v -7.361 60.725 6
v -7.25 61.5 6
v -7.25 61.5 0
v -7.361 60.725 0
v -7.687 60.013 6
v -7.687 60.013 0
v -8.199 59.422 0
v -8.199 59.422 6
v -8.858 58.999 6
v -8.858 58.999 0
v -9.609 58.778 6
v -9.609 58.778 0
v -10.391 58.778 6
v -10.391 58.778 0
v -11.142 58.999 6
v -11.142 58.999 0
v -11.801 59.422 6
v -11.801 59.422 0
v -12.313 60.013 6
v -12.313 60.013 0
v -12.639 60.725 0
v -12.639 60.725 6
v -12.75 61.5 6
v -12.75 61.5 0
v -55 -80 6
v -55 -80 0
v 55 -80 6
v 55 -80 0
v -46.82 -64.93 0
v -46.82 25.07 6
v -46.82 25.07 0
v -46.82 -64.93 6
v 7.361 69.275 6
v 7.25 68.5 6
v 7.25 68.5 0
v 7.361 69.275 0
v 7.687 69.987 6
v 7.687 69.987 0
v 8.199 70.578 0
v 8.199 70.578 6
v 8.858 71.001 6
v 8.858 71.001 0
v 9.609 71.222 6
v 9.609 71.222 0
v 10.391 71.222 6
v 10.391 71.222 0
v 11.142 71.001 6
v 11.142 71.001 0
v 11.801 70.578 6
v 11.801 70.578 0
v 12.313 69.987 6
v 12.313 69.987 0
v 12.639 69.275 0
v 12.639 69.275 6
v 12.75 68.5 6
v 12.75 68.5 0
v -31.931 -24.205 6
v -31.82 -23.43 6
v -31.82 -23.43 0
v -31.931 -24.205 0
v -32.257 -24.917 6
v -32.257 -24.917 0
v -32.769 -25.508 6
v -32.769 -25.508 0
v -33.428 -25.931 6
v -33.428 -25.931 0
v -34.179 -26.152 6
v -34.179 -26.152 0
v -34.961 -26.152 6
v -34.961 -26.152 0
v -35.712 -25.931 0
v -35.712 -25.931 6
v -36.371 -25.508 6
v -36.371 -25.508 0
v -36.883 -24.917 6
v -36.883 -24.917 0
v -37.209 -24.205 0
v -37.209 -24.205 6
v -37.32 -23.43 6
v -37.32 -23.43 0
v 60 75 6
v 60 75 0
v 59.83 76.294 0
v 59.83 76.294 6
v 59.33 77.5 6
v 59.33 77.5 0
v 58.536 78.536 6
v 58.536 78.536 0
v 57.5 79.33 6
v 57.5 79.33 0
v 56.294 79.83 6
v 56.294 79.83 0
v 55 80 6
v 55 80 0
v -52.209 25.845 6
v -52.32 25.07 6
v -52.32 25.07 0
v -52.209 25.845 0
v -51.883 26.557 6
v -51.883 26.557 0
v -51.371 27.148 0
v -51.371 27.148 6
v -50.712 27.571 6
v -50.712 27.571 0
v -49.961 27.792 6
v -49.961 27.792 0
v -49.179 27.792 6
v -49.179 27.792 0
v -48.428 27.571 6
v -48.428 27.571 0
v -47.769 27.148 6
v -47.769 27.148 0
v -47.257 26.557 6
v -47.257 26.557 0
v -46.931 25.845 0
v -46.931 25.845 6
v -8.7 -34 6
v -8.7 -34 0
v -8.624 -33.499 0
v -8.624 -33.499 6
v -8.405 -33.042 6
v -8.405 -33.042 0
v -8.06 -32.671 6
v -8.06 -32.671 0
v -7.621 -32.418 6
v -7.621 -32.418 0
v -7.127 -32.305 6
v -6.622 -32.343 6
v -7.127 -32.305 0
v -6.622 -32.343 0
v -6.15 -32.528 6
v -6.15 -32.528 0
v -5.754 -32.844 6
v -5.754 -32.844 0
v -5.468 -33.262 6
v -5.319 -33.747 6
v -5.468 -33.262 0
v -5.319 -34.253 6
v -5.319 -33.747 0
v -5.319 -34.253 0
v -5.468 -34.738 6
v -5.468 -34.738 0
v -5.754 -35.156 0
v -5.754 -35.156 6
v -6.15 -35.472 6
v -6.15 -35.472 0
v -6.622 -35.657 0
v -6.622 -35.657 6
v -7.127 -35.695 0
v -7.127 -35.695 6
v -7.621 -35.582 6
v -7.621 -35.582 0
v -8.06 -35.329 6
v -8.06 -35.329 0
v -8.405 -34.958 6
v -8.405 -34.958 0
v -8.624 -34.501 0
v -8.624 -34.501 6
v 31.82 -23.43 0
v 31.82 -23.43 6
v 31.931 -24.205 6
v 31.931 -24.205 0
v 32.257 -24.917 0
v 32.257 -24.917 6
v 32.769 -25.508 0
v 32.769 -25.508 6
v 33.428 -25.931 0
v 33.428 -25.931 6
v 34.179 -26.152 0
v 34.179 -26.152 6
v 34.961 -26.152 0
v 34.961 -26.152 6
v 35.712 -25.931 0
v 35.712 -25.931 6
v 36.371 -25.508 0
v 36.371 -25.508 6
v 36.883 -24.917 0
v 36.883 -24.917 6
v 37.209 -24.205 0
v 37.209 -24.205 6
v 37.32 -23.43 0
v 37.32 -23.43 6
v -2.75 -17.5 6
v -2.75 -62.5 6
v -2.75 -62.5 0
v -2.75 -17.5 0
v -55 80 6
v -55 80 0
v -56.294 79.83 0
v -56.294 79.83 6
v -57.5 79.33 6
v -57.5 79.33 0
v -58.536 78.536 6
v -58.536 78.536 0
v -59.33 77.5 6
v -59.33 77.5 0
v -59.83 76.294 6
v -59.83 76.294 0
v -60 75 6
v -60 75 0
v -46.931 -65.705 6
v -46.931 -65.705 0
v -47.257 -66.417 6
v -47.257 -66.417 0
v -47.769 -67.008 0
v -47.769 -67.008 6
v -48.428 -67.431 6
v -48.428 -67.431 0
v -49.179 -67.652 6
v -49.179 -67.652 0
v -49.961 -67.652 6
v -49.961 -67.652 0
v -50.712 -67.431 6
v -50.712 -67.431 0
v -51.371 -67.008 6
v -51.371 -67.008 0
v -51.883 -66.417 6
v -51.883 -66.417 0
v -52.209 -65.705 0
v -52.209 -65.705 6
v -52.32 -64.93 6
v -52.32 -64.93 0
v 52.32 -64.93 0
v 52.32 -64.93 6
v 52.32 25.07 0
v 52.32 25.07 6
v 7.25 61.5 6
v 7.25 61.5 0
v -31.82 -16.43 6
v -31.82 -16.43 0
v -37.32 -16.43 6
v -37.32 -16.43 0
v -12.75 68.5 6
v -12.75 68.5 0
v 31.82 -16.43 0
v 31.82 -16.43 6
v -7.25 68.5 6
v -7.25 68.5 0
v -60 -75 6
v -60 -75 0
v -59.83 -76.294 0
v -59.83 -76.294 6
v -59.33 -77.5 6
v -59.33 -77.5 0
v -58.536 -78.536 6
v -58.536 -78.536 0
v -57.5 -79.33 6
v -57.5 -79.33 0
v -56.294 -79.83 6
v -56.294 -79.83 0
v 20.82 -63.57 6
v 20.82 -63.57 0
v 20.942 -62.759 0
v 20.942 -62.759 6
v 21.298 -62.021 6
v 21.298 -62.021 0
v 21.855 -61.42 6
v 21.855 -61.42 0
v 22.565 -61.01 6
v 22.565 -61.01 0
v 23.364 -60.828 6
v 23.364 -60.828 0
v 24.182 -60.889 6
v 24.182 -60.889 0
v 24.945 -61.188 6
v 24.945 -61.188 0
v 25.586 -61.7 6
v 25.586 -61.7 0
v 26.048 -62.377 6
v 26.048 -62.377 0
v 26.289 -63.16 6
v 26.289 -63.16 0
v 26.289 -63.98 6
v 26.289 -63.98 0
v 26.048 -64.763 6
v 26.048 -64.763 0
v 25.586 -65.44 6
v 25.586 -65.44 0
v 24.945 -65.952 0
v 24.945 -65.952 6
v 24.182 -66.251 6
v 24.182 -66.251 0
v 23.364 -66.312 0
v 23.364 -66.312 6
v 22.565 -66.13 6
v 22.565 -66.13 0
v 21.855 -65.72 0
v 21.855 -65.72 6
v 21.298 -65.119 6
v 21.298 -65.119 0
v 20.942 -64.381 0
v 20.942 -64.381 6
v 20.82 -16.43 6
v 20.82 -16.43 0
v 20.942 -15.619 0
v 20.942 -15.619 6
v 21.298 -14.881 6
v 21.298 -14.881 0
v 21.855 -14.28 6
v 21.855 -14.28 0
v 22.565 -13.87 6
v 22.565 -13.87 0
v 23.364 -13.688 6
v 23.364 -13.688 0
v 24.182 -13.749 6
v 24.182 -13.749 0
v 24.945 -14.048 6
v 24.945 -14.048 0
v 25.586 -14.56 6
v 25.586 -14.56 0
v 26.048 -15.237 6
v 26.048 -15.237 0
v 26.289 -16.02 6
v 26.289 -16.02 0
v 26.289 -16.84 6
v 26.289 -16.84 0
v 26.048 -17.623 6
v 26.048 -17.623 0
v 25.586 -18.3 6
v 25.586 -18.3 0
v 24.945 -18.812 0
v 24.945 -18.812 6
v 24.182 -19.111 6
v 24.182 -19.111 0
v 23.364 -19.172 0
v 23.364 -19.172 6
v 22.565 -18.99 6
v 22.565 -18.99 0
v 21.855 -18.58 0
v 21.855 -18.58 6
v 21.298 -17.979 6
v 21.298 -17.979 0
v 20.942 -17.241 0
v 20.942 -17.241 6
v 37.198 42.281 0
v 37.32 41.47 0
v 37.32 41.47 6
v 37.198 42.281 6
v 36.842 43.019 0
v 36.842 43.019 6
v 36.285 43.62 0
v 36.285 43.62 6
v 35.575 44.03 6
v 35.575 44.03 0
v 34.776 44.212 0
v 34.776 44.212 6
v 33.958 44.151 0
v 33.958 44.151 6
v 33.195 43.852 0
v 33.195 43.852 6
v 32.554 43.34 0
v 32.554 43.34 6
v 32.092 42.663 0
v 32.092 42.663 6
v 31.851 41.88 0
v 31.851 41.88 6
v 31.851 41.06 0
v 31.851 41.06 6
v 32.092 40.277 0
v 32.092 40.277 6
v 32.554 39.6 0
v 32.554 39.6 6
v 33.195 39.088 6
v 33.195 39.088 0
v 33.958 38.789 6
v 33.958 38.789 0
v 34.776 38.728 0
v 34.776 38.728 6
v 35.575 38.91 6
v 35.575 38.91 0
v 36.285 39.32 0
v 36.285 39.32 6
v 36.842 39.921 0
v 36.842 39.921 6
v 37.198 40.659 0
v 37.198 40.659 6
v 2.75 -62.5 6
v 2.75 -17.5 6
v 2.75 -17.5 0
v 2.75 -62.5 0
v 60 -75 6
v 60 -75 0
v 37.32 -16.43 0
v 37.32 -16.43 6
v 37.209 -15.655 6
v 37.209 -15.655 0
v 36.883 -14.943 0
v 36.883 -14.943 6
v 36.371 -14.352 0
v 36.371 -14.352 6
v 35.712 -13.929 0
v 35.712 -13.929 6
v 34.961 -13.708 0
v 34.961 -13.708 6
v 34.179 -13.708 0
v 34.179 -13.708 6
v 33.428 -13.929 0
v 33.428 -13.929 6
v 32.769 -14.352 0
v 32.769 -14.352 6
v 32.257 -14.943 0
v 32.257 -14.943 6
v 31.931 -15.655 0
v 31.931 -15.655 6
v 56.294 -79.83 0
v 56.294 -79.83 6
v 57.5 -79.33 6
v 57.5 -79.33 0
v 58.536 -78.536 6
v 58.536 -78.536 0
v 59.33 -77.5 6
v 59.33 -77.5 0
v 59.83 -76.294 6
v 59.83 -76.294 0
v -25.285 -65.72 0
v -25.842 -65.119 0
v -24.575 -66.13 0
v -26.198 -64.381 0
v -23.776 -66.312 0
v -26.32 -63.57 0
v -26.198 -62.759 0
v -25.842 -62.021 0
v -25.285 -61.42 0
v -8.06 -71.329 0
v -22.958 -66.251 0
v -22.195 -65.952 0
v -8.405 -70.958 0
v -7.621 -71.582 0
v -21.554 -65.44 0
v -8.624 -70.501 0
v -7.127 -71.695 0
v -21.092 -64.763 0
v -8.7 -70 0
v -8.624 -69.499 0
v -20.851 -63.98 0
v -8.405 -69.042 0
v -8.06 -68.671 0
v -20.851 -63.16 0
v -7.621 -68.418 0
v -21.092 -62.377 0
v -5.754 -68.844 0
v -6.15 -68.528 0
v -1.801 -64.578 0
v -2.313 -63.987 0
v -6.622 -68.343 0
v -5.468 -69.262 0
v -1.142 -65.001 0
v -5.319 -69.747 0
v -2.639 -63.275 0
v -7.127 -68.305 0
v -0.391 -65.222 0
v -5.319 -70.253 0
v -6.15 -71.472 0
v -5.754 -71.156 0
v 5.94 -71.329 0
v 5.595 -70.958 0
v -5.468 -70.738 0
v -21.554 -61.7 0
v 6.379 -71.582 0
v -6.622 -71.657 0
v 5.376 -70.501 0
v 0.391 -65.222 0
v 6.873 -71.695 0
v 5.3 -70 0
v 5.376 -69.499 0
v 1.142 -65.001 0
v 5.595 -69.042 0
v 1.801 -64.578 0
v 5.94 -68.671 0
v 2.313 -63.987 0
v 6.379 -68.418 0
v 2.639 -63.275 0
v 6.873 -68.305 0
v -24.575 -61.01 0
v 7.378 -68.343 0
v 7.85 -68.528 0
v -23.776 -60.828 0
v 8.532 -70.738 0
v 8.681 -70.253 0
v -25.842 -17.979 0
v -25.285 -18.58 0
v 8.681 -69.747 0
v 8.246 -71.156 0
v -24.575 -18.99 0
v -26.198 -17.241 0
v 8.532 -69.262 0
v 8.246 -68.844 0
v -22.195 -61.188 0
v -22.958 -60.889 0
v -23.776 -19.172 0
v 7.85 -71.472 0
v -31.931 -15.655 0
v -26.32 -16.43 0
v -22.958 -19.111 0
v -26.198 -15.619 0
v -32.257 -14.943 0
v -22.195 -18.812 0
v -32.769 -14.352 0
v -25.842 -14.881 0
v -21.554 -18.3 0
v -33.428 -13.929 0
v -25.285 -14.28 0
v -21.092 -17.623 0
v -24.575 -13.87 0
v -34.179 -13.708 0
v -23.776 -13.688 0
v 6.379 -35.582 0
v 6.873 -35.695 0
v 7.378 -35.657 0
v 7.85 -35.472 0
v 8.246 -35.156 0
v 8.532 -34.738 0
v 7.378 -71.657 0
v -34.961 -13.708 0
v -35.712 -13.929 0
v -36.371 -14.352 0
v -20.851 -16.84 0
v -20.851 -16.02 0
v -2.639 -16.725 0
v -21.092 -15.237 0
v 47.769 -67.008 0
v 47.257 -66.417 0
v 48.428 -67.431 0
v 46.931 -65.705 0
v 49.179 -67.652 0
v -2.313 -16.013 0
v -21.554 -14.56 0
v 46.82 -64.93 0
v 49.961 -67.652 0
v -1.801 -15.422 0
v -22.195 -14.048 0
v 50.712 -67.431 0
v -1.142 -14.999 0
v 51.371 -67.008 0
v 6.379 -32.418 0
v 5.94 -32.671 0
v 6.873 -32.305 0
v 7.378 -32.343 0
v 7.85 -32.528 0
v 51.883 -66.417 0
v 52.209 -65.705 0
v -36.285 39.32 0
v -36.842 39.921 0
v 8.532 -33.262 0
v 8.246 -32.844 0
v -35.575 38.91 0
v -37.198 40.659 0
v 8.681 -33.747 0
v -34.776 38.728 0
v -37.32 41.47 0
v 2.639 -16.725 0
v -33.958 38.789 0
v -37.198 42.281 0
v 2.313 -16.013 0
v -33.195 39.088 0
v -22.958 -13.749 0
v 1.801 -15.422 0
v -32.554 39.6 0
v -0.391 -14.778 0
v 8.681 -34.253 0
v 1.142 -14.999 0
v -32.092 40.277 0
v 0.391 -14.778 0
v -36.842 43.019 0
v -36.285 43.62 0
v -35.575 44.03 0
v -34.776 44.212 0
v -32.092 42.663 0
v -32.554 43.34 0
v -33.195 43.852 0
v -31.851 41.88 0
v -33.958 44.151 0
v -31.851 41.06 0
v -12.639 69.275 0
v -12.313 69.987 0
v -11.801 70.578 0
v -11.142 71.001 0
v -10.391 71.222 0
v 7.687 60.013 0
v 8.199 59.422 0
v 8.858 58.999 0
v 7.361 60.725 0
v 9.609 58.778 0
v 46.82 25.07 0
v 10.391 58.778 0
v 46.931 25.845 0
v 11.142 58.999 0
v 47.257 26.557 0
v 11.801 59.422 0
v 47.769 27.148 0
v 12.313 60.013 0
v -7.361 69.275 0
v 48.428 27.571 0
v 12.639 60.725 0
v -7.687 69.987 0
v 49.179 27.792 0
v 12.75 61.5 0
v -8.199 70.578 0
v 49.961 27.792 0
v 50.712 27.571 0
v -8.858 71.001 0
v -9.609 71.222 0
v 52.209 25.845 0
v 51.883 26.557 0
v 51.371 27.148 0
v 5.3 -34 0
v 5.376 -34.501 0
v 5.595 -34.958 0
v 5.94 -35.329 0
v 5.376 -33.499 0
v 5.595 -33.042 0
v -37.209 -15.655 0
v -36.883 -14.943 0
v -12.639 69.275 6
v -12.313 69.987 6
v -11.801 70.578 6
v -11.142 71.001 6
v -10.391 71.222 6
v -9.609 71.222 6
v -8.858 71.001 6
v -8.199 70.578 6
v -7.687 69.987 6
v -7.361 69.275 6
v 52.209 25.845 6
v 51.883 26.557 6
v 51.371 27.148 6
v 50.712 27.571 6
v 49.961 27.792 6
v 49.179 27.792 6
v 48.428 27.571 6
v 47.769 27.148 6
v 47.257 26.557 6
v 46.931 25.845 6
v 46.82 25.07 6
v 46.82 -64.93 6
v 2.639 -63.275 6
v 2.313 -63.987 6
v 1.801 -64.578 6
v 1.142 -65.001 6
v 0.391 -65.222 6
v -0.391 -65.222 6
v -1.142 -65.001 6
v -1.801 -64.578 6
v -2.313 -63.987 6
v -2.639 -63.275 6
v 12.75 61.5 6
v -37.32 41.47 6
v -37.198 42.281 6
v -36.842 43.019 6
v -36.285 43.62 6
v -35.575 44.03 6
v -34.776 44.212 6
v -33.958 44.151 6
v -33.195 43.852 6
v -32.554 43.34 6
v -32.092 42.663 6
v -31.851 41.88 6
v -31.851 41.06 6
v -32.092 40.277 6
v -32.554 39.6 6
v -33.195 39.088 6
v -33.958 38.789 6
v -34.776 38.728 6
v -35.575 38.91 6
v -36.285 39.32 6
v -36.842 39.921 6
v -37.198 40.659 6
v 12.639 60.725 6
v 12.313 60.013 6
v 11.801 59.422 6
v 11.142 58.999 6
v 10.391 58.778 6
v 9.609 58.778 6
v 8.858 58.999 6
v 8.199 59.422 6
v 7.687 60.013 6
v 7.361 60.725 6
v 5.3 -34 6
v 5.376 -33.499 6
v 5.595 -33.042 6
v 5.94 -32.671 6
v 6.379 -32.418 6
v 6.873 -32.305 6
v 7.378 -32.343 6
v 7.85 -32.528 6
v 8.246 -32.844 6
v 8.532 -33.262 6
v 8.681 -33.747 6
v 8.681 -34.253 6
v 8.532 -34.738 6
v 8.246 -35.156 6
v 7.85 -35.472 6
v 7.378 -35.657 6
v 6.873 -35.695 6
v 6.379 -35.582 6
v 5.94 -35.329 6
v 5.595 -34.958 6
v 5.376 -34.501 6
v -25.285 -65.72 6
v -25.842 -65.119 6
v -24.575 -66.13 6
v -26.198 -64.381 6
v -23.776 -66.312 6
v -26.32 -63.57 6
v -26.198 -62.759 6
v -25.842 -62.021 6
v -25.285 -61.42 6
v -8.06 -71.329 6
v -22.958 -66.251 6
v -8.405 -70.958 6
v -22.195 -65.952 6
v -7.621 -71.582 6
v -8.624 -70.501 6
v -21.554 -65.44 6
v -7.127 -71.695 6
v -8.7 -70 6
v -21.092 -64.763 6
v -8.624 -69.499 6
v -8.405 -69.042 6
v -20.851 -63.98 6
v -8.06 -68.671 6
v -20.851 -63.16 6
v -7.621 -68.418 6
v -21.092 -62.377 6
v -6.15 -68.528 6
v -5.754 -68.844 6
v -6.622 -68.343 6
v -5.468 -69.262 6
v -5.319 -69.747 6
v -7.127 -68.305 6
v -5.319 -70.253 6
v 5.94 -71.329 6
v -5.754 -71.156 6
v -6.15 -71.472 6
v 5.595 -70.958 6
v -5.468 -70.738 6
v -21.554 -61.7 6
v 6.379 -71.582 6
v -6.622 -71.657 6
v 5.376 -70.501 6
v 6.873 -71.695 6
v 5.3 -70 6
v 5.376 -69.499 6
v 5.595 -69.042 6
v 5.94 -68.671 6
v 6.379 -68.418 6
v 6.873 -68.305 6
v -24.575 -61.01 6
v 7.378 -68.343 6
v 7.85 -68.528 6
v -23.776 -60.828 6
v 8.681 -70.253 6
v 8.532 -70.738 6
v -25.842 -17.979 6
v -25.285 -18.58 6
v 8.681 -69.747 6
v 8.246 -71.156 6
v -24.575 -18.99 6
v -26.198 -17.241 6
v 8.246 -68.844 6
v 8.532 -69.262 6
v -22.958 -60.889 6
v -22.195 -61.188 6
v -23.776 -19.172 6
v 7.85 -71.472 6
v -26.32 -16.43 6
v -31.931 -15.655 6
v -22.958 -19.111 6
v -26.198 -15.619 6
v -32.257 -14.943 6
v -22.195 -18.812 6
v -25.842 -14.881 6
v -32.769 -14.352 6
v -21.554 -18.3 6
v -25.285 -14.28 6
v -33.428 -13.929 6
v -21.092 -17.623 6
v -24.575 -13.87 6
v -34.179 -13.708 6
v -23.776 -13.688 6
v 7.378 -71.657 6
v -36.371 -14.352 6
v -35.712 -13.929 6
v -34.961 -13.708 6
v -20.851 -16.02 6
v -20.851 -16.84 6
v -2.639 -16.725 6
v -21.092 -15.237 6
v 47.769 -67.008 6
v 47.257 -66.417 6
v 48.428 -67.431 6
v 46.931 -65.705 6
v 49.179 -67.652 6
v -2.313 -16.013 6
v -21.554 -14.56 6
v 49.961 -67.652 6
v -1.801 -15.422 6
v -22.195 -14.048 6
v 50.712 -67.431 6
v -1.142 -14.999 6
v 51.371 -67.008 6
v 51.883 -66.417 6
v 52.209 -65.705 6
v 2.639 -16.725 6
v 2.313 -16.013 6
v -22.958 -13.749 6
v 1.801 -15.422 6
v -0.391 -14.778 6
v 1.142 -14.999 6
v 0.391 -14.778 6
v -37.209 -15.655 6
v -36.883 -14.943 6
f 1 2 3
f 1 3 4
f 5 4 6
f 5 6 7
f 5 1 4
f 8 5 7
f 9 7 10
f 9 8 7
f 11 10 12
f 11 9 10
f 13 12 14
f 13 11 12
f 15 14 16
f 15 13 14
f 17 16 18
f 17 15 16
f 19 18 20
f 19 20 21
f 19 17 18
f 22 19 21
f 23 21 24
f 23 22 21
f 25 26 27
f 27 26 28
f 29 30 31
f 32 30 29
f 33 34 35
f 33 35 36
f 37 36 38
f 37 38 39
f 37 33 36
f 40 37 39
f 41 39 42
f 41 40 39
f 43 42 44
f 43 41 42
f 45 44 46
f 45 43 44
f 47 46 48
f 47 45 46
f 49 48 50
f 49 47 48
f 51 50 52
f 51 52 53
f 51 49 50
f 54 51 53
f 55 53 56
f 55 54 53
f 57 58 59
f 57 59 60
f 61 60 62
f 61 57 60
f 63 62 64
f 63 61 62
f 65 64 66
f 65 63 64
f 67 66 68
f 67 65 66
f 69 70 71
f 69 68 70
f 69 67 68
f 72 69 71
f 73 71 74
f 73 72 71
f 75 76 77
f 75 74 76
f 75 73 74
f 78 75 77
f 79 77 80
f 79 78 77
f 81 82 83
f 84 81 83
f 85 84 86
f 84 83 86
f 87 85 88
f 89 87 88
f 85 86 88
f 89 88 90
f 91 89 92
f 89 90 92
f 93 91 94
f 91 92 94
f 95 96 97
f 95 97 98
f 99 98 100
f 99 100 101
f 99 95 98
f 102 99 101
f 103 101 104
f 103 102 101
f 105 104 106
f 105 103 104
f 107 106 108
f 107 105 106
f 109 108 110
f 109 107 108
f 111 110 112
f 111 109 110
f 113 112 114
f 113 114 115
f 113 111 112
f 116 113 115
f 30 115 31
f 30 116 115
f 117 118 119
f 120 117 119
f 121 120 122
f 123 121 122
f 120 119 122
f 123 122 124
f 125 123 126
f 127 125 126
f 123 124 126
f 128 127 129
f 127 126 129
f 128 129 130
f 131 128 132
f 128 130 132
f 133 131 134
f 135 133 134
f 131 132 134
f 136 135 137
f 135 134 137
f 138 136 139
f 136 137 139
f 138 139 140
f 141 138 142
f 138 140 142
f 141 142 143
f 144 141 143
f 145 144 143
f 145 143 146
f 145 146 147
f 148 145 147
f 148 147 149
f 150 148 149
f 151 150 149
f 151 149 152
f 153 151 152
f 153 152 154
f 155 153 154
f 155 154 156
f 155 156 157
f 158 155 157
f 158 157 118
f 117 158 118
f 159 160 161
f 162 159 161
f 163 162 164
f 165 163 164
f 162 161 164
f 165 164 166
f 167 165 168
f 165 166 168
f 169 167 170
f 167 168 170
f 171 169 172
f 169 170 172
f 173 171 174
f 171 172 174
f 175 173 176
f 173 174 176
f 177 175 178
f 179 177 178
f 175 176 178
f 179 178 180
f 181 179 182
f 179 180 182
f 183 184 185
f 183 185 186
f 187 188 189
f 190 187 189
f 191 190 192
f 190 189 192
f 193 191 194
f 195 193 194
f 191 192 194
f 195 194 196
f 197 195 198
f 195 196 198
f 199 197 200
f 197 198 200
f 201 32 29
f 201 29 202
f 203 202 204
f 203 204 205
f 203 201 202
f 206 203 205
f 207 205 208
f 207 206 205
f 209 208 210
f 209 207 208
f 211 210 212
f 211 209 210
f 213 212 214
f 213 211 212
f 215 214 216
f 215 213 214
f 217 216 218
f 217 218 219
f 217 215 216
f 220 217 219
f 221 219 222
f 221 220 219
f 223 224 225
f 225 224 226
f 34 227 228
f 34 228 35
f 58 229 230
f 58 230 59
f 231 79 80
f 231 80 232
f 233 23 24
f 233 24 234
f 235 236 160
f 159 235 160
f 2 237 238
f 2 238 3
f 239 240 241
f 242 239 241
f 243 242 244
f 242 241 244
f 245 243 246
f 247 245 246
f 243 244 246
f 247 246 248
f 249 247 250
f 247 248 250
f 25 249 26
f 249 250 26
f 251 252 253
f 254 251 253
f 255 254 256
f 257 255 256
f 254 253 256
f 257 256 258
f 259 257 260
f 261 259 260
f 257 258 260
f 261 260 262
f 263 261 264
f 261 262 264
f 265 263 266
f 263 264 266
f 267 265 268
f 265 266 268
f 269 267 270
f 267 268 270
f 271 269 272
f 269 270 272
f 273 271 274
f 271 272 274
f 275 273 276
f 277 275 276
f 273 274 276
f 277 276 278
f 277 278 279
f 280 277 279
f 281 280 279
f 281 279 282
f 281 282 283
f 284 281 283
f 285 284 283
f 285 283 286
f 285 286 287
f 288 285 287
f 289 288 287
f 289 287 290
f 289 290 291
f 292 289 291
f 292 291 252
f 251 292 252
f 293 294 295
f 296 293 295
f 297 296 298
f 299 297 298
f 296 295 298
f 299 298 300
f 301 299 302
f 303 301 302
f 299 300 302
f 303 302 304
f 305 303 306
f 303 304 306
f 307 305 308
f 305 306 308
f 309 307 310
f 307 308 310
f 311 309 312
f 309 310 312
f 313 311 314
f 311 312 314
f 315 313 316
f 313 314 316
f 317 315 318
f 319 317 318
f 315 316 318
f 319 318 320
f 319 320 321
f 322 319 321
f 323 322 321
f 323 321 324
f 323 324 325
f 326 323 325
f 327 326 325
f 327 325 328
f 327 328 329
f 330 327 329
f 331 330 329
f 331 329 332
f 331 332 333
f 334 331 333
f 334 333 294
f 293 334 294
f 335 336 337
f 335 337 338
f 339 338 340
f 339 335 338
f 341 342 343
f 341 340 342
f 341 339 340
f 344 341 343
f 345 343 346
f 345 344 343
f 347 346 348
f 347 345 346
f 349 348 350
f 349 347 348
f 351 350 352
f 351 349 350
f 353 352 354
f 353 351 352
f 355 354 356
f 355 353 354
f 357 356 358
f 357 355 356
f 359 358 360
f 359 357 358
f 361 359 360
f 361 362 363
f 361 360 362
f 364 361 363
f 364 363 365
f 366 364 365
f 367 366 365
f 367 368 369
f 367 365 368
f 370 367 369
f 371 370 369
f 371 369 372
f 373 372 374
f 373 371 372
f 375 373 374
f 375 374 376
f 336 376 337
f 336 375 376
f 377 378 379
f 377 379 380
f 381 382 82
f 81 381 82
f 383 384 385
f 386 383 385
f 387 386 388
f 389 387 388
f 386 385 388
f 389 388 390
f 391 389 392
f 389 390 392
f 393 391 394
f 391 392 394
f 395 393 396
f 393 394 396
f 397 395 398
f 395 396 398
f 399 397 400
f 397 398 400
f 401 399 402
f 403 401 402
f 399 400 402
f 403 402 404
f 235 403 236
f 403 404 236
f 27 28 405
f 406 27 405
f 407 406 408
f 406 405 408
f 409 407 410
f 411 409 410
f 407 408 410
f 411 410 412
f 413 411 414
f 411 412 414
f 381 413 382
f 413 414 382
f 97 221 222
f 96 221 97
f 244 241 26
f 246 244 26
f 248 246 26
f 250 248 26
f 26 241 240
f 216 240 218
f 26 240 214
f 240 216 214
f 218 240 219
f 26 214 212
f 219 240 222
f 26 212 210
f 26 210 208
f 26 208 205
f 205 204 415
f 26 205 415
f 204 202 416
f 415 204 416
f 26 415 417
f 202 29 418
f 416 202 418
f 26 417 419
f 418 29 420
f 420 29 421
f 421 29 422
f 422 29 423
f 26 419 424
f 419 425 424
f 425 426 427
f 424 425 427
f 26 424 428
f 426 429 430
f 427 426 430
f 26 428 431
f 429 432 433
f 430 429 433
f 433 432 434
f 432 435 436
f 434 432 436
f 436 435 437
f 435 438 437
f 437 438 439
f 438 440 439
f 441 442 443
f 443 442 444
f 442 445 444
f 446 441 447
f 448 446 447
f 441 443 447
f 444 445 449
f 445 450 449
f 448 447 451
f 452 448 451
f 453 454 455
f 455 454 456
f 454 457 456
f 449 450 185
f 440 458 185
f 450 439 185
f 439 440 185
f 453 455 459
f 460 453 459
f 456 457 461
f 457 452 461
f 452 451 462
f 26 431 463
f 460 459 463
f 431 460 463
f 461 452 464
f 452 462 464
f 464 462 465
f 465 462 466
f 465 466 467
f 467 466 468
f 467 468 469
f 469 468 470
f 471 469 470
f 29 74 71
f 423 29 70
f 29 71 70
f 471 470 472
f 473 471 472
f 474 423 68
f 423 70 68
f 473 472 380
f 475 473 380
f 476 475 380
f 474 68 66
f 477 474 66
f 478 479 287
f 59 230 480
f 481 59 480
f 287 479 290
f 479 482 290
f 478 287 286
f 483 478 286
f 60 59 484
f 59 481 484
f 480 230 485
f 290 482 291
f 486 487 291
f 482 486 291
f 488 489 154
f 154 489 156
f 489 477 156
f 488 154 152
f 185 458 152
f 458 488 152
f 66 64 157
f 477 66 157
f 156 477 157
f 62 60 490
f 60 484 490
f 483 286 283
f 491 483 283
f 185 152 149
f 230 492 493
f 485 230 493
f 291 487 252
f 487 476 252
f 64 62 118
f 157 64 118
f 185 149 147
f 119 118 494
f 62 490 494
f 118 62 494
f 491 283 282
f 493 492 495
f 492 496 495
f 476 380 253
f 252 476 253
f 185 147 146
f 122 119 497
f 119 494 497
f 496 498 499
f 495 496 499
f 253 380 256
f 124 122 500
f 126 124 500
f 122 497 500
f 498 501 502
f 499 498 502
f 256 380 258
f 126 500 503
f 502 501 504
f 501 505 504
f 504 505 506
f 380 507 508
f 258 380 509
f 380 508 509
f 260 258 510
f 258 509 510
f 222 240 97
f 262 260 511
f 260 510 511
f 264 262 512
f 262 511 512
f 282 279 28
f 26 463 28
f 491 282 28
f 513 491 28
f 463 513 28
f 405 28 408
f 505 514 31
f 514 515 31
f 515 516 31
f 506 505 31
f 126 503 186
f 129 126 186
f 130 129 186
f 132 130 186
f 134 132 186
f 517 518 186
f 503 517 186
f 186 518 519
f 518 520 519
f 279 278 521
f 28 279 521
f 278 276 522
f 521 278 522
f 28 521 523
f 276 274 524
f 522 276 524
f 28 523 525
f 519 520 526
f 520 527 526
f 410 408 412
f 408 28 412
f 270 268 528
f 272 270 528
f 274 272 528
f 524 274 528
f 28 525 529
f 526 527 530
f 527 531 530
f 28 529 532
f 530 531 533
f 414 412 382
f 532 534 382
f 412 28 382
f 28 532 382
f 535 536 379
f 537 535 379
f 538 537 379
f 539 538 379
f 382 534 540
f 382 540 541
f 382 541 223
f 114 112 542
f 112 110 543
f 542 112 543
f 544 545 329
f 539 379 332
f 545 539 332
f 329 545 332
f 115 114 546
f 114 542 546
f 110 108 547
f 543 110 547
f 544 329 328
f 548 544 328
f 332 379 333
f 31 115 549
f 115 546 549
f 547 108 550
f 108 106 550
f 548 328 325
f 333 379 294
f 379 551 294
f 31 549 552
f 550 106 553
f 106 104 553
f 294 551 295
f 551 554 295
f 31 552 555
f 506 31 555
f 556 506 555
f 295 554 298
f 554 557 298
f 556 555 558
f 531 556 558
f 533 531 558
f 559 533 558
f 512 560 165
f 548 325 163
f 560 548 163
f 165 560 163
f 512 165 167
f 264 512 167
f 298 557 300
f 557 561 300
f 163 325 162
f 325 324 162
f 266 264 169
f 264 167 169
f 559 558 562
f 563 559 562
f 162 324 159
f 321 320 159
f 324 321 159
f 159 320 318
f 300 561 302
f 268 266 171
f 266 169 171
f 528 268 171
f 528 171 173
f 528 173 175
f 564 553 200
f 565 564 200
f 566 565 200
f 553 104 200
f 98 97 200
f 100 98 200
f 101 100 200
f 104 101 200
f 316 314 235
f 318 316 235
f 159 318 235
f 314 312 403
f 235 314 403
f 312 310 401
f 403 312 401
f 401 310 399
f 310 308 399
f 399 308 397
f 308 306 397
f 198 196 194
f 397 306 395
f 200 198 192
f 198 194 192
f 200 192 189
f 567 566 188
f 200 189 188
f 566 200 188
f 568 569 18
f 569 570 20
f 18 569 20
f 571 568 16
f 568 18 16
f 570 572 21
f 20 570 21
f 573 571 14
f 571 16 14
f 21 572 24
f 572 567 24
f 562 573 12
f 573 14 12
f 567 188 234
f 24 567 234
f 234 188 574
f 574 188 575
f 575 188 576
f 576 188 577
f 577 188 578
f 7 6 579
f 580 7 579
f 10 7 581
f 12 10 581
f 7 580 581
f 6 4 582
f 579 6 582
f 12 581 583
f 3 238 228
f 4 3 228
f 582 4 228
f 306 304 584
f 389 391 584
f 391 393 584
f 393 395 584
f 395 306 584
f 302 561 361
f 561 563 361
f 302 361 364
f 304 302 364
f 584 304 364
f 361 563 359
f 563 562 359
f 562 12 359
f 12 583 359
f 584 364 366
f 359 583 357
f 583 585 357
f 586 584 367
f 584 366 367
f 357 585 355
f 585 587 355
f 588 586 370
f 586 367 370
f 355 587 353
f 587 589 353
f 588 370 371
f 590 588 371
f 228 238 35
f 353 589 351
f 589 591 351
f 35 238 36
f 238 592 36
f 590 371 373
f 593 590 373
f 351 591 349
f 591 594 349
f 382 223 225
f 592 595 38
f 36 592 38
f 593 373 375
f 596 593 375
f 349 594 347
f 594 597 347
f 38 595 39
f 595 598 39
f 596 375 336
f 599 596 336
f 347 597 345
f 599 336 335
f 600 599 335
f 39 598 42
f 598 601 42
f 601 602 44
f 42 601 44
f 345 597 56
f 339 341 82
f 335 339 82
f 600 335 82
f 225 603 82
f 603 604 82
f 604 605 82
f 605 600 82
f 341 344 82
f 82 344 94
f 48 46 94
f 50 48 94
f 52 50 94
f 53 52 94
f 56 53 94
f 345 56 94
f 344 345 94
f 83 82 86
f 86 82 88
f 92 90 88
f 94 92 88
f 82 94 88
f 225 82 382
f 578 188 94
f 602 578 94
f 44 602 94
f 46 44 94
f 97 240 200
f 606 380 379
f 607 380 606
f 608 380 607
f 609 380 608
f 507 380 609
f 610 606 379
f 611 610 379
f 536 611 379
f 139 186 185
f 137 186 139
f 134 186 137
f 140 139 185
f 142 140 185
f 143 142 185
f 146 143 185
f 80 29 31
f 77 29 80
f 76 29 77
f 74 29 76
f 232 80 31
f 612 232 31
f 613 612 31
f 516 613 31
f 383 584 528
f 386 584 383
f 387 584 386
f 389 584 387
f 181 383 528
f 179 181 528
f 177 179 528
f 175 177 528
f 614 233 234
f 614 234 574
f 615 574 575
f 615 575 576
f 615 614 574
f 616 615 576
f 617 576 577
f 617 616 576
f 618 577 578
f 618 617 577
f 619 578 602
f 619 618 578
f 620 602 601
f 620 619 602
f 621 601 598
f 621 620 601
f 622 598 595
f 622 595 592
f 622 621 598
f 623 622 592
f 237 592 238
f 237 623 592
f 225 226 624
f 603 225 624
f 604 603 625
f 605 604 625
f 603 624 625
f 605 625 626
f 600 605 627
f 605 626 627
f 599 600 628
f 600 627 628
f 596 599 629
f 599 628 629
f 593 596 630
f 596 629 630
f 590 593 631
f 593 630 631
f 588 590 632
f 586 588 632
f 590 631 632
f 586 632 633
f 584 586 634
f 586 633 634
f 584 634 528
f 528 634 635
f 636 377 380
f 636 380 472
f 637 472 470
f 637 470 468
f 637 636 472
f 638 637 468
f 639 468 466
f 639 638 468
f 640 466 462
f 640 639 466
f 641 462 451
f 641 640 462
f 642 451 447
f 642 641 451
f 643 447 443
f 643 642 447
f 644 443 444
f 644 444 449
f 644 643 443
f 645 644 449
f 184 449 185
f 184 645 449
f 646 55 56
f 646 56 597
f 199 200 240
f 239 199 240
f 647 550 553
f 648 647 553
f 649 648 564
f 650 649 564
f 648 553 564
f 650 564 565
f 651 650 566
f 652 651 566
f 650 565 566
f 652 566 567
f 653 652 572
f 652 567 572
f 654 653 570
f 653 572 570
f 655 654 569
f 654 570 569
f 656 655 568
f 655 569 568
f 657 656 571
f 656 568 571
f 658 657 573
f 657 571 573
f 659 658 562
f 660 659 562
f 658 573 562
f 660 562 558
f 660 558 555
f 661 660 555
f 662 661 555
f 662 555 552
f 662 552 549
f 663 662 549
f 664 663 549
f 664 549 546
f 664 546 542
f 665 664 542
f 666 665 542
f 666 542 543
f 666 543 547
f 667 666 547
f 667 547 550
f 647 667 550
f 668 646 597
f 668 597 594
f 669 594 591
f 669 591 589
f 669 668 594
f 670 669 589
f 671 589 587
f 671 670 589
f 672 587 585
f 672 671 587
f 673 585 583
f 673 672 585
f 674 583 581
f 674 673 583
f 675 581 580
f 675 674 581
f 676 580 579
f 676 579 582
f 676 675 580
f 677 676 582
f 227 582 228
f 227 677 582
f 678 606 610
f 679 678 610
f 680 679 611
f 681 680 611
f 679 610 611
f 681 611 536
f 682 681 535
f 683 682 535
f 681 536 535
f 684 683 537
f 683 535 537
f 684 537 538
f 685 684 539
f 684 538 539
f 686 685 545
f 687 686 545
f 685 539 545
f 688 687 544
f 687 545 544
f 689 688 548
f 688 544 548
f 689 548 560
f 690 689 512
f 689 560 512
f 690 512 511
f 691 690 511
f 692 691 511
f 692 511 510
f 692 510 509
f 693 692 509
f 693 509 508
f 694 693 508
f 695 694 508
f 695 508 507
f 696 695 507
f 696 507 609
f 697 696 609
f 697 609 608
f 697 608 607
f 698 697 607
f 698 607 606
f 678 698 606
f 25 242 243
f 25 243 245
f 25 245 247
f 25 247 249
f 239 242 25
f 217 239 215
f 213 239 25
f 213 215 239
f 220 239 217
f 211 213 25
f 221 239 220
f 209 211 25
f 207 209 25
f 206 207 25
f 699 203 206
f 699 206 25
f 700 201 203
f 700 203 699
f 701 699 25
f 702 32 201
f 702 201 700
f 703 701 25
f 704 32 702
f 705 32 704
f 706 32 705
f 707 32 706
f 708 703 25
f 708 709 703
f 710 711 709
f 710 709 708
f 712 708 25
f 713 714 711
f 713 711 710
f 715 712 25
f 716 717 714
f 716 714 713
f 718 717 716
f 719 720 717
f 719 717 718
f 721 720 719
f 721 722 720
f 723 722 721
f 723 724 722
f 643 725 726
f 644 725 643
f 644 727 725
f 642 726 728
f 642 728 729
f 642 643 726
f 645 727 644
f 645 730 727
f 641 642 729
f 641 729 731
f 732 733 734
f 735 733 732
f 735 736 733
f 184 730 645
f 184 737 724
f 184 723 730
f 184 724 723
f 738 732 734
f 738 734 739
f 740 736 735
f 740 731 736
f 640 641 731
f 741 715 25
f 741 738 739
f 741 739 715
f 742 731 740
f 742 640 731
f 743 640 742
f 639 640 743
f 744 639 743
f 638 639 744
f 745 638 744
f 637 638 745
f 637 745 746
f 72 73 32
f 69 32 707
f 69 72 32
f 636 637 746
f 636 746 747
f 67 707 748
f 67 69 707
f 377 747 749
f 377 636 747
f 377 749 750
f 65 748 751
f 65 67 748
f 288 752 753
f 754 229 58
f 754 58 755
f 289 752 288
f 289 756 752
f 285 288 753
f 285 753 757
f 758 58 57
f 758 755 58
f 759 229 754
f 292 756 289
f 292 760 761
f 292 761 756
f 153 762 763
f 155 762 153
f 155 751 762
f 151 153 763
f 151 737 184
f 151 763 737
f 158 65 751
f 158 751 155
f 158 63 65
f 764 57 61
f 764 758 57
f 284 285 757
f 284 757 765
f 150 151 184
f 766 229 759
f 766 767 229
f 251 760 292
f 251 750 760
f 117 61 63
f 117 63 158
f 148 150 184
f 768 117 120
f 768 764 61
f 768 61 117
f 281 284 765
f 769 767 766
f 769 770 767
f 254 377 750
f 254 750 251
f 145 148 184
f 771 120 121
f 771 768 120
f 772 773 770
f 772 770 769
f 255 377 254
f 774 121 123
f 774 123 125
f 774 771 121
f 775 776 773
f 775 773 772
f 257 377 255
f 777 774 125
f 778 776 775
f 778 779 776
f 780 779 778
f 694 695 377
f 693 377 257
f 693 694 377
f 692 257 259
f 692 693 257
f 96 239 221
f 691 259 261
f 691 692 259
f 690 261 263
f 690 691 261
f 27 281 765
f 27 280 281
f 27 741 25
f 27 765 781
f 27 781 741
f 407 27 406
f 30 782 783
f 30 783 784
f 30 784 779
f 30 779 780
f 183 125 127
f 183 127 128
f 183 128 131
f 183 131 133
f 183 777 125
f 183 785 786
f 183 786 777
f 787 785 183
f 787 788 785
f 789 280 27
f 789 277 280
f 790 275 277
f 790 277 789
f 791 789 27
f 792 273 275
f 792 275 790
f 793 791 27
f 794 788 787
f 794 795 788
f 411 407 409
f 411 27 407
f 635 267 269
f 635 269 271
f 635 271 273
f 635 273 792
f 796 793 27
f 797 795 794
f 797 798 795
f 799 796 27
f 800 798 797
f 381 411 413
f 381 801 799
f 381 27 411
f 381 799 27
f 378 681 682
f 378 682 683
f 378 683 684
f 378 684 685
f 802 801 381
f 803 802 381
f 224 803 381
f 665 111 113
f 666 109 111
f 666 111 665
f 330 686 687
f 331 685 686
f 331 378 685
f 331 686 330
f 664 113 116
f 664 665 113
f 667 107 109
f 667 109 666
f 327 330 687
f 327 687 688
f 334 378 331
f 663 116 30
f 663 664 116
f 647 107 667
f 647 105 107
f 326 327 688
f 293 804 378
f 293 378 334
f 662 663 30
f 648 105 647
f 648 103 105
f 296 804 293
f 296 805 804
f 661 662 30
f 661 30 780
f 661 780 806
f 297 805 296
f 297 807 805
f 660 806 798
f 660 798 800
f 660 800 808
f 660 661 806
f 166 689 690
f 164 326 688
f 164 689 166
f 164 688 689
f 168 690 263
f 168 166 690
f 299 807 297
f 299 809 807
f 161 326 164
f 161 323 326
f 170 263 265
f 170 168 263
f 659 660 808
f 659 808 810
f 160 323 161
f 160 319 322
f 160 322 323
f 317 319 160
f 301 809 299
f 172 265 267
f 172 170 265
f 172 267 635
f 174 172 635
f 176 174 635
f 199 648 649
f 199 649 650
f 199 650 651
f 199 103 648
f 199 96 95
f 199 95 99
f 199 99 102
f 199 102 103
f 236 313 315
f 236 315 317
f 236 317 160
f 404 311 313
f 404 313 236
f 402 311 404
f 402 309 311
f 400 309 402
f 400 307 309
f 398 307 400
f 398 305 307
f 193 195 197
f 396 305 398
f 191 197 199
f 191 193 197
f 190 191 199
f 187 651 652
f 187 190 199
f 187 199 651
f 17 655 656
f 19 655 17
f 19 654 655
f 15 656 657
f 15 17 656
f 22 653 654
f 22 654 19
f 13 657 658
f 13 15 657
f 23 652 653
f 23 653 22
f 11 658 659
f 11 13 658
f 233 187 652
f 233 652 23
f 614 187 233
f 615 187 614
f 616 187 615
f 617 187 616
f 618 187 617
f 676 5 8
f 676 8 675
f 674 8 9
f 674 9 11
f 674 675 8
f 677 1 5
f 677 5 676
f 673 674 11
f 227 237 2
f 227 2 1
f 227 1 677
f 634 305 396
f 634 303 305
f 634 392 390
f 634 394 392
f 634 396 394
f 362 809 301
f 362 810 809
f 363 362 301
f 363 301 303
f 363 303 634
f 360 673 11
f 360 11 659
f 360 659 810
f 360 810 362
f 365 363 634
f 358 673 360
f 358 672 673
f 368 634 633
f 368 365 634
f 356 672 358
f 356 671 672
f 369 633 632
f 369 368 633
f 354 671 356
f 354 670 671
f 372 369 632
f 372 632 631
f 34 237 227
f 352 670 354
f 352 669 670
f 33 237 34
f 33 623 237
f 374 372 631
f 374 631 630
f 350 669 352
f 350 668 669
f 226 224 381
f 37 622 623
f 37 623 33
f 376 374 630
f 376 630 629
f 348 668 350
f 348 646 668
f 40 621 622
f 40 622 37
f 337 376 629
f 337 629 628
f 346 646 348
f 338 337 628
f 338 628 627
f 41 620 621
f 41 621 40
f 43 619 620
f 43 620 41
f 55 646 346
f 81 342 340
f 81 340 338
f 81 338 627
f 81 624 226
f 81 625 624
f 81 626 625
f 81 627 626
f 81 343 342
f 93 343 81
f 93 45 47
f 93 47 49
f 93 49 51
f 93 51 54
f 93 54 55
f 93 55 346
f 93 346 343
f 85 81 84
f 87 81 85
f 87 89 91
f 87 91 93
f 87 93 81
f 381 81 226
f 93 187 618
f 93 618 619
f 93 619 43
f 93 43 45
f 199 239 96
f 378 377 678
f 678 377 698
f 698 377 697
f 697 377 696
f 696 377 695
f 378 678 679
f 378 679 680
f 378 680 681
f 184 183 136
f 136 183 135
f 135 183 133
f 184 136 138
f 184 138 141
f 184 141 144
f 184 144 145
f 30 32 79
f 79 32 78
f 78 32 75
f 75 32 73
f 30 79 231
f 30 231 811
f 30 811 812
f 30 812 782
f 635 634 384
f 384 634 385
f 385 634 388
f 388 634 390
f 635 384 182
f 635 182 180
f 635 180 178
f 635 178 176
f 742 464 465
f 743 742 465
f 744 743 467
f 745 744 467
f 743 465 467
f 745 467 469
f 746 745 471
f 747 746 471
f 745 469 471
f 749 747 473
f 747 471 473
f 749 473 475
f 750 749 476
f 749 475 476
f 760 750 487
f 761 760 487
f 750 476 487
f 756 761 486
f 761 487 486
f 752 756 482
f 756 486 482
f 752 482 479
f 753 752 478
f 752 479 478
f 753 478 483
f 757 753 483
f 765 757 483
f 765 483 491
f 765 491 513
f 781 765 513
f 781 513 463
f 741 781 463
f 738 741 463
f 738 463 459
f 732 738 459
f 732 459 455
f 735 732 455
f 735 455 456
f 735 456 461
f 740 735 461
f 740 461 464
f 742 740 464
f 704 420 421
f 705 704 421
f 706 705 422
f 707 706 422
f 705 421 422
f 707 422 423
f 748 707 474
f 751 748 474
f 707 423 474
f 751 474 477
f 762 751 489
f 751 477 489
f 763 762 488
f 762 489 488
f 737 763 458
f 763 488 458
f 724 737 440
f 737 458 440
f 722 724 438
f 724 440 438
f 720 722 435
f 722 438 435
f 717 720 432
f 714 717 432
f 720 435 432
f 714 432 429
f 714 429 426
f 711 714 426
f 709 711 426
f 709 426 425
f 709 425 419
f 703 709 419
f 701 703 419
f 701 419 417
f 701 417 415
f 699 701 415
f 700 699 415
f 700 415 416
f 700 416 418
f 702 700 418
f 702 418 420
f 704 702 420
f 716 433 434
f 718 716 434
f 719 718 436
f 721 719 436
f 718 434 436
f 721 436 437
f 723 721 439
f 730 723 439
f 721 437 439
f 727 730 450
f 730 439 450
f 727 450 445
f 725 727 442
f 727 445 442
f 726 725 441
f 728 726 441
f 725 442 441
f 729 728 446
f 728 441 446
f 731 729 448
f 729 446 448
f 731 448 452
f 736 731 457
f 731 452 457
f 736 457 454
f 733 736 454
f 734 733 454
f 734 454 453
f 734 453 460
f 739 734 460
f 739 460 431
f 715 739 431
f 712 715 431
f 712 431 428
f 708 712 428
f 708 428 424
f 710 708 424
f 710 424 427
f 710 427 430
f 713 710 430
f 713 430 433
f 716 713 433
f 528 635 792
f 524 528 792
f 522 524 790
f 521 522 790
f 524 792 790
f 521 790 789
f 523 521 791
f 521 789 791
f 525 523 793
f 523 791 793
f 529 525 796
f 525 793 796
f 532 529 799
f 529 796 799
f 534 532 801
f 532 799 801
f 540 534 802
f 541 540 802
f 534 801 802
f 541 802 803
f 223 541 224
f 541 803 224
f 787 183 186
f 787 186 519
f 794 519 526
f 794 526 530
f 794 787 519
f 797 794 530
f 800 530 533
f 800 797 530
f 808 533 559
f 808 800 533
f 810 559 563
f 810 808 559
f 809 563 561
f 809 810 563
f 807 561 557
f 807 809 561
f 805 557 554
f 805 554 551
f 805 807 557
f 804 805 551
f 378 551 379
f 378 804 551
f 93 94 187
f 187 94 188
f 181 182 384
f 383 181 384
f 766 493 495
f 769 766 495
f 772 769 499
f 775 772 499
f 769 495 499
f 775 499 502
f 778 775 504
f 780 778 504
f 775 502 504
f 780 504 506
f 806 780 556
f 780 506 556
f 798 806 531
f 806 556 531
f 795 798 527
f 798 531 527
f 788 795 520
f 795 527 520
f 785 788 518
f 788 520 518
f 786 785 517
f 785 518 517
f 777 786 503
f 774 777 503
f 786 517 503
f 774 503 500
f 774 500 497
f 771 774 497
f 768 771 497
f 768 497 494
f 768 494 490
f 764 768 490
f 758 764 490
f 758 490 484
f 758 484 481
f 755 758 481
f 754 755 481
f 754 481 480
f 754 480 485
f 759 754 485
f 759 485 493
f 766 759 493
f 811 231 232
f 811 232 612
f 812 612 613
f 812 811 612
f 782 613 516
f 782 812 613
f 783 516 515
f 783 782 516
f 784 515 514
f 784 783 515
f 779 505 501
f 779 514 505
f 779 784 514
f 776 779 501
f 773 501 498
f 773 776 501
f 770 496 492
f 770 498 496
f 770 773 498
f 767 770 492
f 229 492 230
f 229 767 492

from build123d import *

# Parameters (mm, degrees)
BOSS_EXTRUDE1_DEPTH      = 6
CUT_EXTRUDE1_DEPTH       = 6
M5_CLEARANCE_HOLE1_D     = 5.5
CUT_EXTRUDE2_DEPTH       = 22
M5_CLEARANCE_HOLE2_D     = 5.5
CUT_EXTRUDE3_DEPTH       = 6
CUT_EXTRUDE4_DEPTH       = 6
M3_CLEARANCE_HOLE1_D     = 3.4
M3_CLEARANCE_HOLE1_DEPTH = 10
M3_CLEARANCE_HOLE1_TIP   = 1.021463052


with BuildPart() as part:
    # Sketch2 → Boss-Extrude1 (new body)
    with BuildSketch(Plane.XY):
        with BuildLine():
            Line((-55, -80), (55, -80))
            ThreePointArc((55, -80), (58.535533906, -78.535533906), (60, -75))
            Line((60, -75), (60, 75))
            ThreePointArc((60, 75), (58.535533906, 78.535533906), (55, 80))
            Line((55, 80), (-55, 80))
            ThreePointArc((-55, 80), (-58.535533906, 78.535533906), (-60, 75))
            Line((-60, 75), (-60, -75))
            ThreePointArc((-60, -75), (-58.535533906, -78.535533906), (-55, -80))
        make_face()
    extrude(amount=BOSS_EXTRUDE1_DEPTH)

    # Sketch3 → Cut-Extrude1 (cut)
    with BuildSketch(Plane.XY.offset(6)):
        with BuildLine():
            Line((2.75, -17.5), (2.75, -62.5))
            ThreePointArc((2.75, -62.5), (0, -65.25), (-2.75, -62.5))
            Line((-2.75, -62.5), (-2.75, -17.5))
            ThreePointArc((-2.75, -17.5), (0, -14.75), (2.75, -17.5))
        make_face()
    extrude(amount=-CUT_EXTRUDE1_DEPTH, mode=Mode.SUBTRACT)

    # M5 Clearance Hole1 (through all)
    with Locations(Plane.XY.offset(6)):
        with Locations((-23.57, -63.57), (-23.57, -16.43), (23.57, -16.43), (23.57, -63.57)):
            Hole(M5_CLEARANCE_HOLE1_D / 2)

    # Sketch6 → Cut-Extrude2 (cut)
    with BuildSketch(Plane.XY.offset(6)):
        with BuildLine():
            Line((-31.82, -16.43), (-31.82, -23.43))
            ThreePointArc((-31.82, -23.43), (-34.57, -26.18), (-37.32, -23.43))
            Line((-37.32, -23.43), (-37.32, -16.43))
            ThreePointArc((-37.32, -16.43), (-34.57, -13.68), (-31.82, -16.43))
        make_face()
    cut_extrude2 = extrude(amount=-CUT_EXTRUDE2_DEPTH, mode=Mode.SUBTRACT)

    # M5 Clearance Hole2 (through all)
    with Locations(Plane.XY.offset(6)):
        with Locations((-34.57, 41.47)):
            m5_clearance_hole2 = Hole(M5_CLEARANCE_HOLE2_D / 2)

    # Sketch9 → Cut-Extrude3 (cut)
    with BuildSketch(Plane.XY.offset(6)):
        with BuildLine():
            Line((-46.82, 25.07), (-46.82, -64.93))
            ThreePointArc((-46.82, -64.93), (-49.57, -67.68), (-52.32, -64.93))
            Line((-52.32, -64.93), (-52.32, 25.07))
            ThreePointArc((-52.32, 25.07), (-49.57, 27.82), (-46.82, 25.07))
        make_face()
    cut_extrude3 = extrude(amount=-CUT_EXTRUDE3_DEPTH, mode=Mode.SUBTRACT)

    # Mirror2: Cut-Extrude2, M5 Clearance Hole2, Cut-Extrude3 across plane
    add(cut_extrude2.mirror(Plane(origin=(0, 0, 0), x_dir=(0, 0, 1), z_dir=(1, 0, 0))), mode=Mode.SUBTRACT)
    add(m5_clearance_hole2.mirror(Plane(origin=(0, 0, 0), x_dir=(0, 0, 1), z_dir=(1, 0, 0))), mode=Mode.SUBTRACT)
    add(cut_extrude3.mirror(Plane(origin=(0, 0, 0), x_dir=(0, 0, 1), z_dir=(1, 0, 0))), mode=Mode.SUBTRACT)

    # Sketch11 → Cut-Extrude4 (cut)
    with BuildSketch(Plane.XY.offset(6)):
        with BuildLine():
            Line((-7.25, 68.5), (-7.25, 61.5))
            ThreePointArc((-7.25, 61.5), (-10, 58.75), (-12.75, 61.5))
            Line((-12.75, 61.5), (-12.75, 68.5))
            ThreePointArc((-12.75, 68.5), (-10, 71.25), (-7.25, 68.5))
        make_face()
        with BuildLine():
            Line((12.75, 68.5), (12.75, 61.5))
            ThreePointArc((12.75, 61.5), (10, 58.75), (7.25, 61.5))
            Line((7.25, 61.5), (7.25, 68.5))
            ThreePointArc((7.25, 68.5), (10, 71.25), (12.75, 68.5))
        make_face()
    extrude(amount=-CUT_EXTRUDE4_DEPTH, mode=Mode.SUBTRACT)

    # M3 Clearance Hole1
    with Locations(Plane.XY.offset(6)):
        with Locations((-7, -34), (7, -34), (7, -70), (-7, -70)):
            Hole(M3_CLEARANCE_HOLE1_D / 2, depth=M3_CLEARANCE_HOLE1_DEPTH)
            with Locations((0, 0, -(M3_CLEARANCE_HOLE1_DEPTH + M3_CLEARANCE_HOLE1_TIP / 2))):  # 118° drill point
                Cone(0, M3_CLEARANCE_HOLE1_D / 2, M3_CLEARANCE_HOLE1_TIP, mode=Mode.SUBTRACT)


solid = part.part
